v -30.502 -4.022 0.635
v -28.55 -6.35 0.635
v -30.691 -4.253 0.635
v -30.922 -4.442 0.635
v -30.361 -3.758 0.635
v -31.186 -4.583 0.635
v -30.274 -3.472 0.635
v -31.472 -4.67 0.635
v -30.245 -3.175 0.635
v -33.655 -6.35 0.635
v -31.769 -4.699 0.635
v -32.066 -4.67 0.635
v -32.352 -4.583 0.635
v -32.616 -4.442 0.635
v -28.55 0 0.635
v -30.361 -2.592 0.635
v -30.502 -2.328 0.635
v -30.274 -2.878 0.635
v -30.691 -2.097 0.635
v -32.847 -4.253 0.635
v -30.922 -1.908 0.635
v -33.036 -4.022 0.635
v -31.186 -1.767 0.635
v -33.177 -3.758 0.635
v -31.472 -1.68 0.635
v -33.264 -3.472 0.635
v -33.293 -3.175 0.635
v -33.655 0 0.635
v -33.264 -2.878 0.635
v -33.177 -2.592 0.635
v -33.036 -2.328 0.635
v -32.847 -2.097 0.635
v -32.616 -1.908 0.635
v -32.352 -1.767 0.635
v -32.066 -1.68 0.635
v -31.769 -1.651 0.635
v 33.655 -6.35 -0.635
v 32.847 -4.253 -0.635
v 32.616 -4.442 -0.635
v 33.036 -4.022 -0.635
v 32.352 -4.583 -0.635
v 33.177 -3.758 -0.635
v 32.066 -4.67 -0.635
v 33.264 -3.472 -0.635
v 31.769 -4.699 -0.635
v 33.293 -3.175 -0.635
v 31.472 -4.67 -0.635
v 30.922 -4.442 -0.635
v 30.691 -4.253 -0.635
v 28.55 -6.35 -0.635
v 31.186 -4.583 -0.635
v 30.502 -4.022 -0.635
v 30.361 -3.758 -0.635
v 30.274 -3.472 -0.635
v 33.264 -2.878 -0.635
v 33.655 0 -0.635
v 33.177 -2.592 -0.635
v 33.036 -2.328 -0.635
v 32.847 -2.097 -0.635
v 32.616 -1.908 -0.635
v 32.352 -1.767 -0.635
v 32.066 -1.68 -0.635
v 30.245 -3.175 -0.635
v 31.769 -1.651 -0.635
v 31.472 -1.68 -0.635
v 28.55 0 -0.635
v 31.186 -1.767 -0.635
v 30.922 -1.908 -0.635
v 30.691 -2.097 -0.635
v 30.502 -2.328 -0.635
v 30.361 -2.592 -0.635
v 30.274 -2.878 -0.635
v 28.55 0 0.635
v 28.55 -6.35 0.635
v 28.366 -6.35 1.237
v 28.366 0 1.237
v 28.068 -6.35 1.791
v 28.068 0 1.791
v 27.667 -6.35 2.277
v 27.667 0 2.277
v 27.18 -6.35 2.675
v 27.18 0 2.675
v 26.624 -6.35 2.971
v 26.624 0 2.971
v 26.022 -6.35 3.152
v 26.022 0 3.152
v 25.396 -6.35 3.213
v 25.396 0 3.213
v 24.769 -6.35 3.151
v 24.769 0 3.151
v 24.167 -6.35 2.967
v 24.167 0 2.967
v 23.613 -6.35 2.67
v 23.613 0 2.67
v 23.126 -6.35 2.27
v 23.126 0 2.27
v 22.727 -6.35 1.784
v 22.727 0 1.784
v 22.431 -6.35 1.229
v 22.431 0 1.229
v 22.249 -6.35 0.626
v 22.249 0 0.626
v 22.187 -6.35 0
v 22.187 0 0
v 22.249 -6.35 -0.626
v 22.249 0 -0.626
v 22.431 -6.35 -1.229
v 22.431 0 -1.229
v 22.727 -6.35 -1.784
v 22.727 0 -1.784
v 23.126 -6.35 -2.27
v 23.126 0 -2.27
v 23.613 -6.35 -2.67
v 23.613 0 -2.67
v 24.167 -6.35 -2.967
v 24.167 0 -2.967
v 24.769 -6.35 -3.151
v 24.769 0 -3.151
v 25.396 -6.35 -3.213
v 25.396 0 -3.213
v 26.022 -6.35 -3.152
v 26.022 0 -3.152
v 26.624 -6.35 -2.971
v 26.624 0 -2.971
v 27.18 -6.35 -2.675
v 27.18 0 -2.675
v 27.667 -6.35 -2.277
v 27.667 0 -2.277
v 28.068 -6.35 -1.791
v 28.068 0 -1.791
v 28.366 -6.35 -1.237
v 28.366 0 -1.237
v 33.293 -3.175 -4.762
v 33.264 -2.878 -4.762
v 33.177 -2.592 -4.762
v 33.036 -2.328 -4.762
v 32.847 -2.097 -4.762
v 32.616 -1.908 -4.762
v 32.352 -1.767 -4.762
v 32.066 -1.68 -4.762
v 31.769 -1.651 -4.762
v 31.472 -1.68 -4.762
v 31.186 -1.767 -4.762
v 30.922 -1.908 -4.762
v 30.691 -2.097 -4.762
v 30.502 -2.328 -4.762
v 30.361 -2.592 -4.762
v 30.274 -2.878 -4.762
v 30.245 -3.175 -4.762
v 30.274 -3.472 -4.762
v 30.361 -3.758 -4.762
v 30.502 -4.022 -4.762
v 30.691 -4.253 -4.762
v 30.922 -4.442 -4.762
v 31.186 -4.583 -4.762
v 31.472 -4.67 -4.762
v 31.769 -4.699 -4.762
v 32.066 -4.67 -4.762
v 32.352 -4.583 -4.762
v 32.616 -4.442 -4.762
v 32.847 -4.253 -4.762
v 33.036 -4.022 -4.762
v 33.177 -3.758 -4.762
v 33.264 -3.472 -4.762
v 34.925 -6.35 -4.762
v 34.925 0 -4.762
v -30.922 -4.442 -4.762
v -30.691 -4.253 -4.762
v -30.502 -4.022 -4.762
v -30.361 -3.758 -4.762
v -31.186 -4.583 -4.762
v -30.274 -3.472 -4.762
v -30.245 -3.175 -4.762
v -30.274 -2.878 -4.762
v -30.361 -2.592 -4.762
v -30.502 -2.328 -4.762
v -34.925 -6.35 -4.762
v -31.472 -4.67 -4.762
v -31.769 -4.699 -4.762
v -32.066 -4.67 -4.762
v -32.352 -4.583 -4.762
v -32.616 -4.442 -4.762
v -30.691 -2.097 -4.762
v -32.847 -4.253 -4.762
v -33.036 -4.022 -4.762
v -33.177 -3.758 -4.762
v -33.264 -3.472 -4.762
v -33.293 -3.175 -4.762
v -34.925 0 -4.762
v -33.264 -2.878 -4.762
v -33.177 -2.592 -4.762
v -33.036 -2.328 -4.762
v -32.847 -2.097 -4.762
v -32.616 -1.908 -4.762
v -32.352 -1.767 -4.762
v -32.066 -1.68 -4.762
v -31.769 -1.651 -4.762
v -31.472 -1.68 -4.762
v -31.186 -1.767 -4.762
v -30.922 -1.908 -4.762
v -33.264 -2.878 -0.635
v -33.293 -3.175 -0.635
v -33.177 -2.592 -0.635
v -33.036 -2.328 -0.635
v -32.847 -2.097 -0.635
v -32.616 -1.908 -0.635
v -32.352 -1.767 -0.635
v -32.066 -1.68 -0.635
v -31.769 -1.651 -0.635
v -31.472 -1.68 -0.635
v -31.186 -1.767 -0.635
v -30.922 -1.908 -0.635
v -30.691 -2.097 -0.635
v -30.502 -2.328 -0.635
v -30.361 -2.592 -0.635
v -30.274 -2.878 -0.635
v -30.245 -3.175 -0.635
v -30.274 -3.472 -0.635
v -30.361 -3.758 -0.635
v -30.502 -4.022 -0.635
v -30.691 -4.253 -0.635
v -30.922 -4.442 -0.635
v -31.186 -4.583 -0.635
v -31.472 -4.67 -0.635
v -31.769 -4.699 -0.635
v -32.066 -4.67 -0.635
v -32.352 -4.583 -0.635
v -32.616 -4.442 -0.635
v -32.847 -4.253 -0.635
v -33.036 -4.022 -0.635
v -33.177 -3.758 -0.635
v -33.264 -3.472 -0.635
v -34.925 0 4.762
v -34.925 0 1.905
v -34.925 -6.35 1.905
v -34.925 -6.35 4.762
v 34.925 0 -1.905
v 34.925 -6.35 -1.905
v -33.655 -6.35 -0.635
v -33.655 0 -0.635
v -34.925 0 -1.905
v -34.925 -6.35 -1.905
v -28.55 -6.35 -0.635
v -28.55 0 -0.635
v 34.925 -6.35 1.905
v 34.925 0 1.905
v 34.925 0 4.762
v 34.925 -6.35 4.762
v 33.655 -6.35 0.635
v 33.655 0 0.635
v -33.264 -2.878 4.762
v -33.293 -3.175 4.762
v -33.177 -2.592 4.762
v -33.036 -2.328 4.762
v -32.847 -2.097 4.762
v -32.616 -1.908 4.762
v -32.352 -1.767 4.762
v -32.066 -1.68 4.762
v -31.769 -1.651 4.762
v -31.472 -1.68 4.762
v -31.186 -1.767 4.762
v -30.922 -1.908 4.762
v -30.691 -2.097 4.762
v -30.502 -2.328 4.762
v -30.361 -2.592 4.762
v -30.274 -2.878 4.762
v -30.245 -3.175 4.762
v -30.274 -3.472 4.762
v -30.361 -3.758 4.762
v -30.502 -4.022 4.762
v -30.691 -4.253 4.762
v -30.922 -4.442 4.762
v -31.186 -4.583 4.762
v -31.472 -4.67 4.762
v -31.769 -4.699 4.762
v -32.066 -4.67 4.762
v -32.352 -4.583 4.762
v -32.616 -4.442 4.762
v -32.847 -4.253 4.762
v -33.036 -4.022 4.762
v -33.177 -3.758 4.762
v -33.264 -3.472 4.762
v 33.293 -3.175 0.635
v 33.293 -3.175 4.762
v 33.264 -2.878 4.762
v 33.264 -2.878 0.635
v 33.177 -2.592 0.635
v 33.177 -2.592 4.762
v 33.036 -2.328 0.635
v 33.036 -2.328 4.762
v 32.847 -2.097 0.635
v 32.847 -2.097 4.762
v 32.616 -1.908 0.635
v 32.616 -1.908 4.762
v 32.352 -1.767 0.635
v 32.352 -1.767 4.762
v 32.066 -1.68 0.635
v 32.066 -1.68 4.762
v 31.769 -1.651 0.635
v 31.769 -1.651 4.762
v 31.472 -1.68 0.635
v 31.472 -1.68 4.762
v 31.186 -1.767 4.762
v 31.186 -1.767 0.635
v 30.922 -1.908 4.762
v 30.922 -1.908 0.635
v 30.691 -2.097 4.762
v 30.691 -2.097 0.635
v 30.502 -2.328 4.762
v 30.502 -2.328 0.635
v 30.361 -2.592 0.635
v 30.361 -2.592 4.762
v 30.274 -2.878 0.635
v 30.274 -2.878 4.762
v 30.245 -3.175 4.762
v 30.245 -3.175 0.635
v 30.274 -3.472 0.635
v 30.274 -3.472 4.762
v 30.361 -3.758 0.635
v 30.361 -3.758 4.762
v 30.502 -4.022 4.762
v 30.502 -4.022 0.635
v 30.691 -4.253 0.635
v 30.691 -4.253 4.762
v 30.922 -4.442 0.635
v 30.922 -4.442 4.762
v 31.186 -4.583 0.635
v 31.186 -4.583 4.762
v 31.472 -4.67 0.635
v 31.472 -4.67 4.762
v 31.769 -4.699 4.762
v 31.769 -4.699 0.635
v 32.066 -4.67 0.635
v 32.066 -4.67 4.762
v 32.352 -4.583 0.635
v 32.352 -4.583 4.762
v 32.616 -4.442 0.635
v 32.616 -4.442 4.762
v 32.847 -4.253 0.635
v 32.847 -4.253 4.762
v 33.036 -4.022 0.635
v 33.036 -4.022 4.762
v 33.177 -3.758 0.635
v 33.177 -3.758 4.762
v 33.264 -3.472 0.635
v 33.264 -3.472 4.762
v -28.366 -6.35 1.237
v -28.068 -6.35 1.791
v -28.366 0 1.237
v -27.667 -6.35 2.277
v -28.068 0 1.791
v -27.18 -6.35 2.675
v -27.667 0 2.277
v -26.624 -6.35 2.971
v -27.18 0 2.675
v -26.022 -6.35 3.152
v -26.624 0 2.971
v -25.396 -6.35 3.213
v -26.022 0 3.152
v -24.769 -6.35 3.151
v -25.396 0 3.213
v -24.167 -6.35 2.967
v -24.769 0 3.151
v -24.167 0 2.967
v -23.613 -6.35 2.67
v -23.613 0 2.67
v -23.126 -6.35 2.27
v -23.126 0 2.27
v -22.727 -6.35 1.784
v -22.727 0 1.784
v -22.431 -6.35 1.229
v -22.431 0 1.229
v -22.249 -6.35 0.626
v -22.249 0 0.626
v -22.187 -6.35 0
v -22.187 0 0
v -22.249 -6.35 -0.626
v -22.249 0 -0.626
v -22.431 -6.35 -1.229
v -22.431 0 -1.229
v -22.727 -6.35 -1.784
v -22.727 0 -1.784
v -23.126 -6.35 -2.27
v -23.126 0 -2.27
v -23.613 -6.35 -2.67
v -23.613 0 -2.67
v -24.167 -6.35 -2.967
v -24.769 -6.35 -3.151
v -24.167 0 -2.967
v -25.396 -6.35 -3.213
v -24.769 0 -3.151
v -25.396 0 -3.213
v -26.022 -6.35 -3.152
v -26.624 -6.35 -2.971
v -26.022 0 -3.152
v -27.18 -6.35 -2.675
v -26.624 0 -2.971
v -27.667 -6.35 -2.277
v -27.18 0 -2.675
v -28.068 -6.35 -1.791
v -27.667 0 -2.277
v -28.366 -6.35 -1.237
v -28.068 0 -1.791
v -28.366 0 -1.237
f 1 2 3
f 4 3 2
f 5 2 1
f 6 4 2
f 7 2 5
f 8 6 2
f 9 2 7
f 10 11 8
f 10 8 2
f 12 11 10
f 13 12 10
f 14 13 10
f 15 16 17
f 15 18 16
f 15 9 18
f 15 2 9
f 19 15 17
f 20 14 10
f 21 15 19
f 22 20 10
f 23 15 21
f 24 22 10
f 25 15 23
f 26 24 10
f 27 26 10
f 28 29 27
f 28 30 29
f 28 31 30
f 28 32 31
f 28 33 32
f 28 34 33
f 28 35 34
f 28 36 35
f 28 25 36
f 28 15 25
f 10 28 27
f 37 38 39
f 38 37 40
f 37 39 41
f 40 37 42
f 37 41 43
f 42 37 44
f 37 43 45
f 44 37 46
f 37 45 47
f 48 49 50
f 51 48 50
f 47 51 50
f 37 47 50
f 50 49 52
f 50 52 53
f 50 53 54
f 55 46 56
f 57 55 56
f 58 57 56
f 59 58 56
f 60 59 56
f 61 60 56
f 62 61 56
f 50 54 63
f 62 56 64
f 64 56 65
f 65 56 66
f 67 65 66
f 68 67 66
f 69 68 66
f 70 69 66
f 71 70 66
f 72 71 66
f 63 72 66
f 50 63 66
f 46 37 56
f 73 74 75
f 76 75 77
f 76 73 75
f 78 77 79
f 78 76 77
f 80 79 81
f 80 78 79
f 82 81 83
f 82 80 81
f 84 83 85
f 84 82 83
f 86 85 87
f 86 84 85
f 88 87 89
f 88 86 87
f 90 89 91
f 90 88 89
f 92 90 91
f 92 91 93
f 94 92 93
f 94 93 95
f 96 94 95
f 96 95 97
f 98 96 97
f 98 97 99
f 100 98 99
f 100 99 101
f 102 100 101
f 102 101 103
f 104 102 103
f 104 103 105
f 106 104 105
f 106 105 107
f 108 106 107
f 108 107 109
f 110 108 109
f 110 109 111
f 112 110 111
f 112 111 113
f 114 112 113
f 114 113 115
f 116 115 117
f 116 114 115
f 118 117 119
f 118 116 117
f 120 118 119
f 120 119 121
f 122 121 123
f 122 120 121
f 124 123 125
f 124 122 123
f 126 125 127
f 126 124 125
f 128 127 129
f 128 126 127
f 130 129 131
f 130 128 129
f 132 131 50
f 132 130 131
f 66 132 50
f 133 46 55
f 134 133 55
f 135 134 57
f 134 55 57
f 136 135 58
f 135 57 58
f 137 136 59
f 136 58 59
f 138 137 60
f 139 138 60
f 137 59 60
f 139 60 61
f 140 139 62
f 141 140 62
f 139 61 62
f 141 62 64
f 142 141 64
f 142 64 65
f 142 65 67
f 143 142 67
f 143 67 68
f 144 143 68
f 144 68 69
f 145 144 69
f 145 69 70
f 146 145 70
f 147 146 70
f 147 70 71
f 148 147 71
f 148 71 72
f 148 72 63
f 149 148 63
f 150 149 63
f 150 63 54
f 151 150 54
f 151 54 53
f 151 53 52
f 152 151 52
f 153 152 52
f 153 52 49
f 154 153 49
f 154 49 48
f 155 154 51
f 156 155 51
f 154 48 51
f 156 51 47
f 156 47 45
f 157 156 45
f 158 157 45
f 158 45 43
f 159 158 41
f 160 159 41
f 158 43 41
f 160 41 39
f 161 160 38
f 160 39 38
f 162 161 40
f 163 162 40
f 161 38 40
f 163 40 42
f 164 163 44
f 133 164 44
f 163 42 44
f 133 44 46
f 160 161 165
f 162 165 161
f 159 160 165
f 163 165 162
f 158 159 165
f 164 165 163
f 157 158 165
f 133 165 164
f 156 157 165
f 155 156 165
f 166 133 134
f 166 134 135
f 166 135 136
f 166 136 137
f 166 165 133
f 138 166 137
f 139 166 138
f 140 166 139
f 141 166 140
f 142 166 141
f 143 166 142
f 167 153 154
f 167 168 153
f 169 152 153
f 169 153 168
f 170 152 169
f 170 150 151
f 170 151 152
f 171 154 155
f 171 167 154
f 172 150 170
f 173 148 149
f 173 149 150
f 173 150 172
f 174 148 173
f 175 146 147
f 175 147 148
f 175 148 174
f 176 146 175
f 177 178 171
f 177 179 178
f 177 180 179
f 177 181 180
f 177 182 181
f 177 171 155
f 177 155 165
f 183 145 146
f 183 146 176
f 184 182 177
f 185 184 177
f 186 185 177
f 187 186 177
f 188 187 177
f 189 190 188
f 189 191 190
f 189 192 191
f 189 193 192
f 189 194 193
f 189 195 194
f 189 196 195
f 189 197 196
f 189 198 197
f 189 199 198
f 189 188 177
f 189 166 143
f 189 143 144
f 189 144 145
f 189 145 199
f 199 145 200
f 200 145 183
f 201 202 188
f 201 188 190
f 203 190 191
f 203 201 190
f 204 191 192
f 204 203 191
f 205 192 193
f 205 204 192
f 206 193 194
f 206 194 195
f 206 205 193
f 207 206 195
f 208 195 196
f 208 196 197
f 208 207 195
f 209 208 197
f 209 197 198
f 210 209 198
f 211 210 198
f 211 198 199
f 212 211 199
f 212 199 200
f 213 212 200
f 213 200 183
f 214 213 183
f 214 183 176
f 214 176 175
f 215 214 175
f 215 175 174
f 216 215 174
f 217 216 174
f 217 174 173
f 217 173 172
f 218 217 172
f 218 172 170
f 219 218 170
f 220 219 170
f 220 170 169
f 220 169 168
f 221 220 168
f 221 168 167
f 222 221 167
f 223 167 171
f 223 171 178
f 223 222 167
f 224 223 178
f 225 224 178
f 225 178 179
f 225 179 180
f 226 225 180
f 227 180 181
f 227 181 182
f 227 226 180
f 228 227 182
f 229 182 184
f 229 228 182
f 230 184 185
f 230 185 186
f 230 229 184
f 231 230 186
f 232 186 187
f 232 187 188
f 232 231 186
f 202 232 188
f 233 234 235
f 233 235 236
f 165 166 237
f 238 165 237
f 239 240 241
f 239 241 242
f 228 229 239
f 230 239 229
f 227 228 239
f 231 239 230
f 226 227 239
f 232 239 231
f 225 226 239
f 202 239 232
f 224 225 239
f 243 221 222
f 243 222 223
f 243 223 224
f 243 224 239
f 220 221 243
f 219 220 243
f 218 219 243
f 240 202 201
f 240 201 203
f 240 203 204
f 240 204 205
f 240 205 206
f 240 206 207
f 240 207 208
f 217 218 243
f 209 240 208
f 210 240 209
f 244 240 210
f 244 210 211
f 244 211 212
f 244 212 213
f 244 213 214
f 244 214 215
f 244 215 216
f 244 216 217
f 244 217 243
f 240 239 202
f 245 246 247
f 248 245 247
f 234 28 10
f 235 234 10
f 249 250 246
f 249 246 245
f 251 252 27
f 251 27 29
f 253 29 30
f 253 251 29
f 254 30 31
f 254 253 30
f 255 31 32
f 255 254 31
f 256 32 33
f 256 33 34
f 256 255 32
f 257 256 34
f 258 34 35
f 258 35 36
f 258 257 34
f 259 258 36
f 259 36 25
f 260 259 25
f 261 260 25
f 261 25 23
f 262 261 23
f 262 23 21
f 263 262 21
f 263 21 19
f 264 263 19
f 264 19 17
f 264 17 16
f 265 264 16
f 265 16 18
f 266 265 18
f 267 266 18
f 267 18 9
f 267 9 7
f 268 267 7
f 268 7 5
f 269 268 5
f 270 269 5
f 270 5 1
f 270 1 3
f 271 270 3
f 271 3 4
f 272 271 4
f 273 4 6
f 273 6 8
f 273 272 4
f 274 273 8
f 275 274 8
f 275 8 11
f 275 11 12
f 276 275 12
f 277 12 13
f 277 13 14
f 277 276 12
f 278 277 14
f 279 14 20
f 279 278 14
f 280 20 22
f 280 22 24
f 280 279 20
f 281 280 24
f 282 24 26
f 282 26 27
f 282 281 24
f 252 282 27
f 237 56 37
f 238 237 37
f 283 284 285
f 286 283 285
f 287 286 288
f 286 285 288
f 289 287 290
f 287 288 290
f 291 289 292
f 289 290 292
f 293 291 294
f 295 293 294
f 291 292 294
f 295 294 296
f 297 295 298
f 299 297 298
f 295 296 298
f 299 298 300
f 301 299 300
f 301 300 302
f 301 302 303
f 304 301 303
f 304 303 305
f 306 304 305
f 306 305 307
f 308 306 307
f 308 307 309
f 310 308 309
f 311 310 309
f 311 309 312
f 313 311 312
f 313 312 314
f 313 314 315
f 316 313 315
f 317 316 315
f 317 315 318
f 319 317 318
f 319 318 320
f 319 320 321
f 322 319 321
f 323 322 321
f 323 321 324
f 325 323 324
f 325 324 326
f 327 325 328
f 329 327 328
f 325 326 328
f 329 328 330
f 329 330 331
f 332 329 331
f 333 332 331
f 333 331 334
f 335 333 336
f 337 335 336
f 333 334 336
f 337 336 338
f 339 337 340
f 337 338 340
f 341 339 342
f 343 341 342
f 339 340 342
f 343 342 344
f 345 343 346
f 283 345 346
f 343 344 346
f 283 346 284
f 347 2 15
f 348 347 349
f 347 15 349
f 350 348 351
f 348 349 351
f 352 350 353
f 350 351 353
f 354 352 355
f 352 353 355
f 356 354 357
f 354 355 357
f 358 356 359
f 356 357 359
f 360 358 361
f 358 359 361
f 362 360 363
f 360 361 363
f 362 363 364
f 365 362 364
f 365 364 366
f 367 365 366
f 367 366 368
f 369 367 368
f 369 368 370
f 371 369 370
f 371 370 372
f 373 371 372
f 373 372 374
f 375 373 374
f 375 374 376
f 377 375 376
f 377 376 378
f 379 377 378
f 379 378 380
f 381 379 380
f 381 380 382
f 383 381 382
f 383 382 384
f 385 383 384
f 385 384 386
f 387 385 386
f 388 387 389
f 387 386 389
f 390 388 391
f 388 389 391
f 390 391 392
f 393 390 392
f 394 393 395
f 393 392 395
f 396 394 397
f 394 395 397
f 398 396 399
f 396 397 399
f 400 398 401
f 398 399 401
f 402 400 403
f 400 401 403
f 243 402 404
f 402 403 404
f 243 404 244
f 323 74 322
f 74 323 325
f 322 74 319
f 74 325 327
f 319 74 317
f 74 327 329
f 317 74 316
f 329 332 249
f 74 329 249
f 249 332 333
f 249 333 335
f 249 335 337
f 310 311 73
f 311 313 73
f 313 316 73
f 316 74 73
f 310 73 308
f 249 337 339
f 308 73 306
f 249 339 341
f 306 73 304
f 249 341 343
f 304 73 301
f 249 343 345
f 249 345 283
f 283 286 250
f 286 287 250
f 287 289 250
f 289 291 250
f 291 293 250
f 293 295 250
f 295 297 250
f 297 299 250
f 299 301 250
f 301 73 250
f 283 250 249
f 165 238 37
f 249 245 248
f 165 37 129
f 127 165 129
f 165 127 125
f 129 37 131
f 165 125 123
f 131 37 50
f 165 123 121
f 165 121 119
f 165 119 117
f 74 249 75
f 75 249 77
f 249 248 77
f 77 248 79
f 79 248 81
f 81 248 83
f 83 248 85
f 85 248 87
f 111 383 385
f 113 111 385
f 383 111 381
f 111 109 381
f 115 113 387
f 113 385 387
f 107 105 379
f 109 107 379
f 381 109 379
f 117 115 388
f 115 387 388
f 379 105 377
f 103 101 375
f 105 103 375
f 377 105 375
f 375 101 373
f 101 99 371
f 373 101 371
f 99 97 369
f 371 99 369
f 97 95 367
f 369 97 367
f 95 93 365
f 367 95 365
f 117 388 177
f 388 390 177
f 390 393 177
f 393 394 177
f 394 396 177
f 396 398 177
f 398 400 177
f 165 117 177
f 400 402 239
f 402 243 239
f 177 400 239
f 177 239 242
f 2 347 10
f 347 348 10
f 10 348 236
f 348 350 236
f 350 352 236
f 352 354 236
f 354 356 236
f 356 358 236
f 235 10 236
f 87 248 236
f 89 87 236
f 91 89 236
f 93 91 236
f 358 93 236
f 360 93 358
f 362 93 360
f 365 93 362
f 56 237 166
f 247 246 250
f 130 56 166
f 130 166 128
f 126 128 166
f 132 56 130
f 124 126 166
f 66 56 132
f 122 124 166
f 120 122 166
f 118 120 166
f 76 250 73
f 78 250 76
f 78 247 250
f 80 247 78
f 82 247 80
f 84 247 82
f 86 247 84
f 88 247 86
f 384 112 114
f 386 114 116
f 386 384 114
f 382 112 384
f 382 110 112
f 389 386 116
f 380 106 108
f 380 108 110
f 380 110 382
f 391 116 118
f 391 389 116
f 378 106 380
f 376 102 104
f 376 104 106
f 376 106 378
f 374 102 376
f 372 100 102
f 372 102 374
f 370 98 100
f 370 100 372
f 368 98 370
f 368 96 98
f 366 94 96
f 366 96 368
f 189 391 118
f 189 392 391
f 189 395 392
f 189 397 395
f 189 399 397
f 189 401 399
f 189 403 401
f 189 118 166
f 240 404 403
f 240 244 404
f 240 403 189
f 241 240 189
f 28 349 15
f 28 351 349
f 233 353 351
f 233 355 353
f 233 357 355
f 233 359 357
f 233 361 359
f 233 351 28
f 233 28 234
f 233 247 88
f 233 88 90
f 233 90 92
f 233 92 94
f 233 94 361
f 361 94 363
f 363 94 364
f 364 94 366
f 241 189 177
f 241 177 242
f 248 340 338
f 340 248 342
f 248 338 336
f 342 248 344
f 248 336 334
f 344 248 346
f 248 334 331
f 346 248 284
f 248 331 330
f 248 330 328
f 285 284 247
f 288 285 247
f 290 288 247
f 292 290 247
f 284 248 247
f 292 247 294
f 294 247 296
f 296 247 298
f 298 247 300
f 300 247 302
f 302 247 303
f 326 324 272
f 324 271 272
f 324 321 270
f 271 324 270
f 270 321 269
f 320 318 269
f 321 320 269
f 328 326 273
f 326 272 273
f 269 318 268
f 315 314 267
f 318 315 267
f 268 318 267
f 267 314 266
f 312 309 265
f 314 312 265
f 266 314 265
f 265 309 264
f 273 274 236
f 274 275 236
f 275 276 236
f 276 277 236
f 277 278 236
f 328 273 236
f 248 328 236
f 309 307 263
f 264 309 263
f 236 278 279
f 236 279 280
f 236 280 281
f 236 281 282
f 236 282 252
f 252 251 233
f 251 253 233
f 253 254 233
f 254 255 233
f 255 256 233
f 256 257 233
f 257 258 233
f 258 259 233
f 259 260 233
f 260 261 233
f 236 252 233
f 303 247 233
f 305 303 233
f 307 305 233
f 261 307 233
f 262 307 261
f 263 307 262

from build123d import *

# Parameters (mm, degrees)
F0_W     = 34.925
F0_H     = 9.525
F0_R     = 3.2131
F1_DEPTH = 6.35
F2_R     = 1.524
F3_DEPTH = 9.525
F5_DEPTH = 6.351
F6_SIZE  = 1.27


with BuildPart() as f1:
    # F0 (on Front) → F1 (new body)
    with BuildSketch(Plane.XZ):
        with Locations((17.4625, 0)):
            Rectangle(F0_W, F0_H)
        with Locations((25.4, 0)):
            Circle(F0_R, mode=Mode.SUBTRACT)
    extrude(amount=F1_DEPTH)

    # F2 (on face) → F3 (cut, through all)
    with BuildSketch(Plane.XY.offset(4.7625)):
        with Locations((31.76905, -3.175)):
            Circle(F2_R)
    extrude(amount=-F3_DEPTH, mode=Mode.SUBTRACT)

    # F4 (on face) → F5 (cut, through all)
    with BuildSketch(Plane(origin=(0, 0, 0), x_dir=(-1, 0, 0), z_dir=(0, 1, 0))):
        with BuildLine():
            Line((-28.5497280216, 0.635), (-34.925, 0.635))
            Line((-34.925, 0.635), (-34.925, -0.635))
            Line((-34.925, -0.635), (-28.5497280216, -0.635))
            ThreePointArc((-28.5497280216, -0.635), (-28.6131, 0), (-28.5497280216, 0.635))
        make_face()
    extrude(amount=-F5_DEPTH, mode=Mode.SUBTRACT)

    # F6
    f6_edges = [f1.edges().sort_by_distance(p)[0] for p in [
        (34.925, -3.175, 0.635),
        (34.925, -3.175, -0.635),
    ]]
    chamfer(f6_edges, length=F6_SIZE)

    # F7: F1 across face


with BuildPart() as f1_1:
    add(f1.part)
    add(f1.part.mirror(Plane(origin=(0, -3.175, 0), x_dir=(0, -1, 0), z_dir=(-1, 0, 0))))


solid = f1_1.part
